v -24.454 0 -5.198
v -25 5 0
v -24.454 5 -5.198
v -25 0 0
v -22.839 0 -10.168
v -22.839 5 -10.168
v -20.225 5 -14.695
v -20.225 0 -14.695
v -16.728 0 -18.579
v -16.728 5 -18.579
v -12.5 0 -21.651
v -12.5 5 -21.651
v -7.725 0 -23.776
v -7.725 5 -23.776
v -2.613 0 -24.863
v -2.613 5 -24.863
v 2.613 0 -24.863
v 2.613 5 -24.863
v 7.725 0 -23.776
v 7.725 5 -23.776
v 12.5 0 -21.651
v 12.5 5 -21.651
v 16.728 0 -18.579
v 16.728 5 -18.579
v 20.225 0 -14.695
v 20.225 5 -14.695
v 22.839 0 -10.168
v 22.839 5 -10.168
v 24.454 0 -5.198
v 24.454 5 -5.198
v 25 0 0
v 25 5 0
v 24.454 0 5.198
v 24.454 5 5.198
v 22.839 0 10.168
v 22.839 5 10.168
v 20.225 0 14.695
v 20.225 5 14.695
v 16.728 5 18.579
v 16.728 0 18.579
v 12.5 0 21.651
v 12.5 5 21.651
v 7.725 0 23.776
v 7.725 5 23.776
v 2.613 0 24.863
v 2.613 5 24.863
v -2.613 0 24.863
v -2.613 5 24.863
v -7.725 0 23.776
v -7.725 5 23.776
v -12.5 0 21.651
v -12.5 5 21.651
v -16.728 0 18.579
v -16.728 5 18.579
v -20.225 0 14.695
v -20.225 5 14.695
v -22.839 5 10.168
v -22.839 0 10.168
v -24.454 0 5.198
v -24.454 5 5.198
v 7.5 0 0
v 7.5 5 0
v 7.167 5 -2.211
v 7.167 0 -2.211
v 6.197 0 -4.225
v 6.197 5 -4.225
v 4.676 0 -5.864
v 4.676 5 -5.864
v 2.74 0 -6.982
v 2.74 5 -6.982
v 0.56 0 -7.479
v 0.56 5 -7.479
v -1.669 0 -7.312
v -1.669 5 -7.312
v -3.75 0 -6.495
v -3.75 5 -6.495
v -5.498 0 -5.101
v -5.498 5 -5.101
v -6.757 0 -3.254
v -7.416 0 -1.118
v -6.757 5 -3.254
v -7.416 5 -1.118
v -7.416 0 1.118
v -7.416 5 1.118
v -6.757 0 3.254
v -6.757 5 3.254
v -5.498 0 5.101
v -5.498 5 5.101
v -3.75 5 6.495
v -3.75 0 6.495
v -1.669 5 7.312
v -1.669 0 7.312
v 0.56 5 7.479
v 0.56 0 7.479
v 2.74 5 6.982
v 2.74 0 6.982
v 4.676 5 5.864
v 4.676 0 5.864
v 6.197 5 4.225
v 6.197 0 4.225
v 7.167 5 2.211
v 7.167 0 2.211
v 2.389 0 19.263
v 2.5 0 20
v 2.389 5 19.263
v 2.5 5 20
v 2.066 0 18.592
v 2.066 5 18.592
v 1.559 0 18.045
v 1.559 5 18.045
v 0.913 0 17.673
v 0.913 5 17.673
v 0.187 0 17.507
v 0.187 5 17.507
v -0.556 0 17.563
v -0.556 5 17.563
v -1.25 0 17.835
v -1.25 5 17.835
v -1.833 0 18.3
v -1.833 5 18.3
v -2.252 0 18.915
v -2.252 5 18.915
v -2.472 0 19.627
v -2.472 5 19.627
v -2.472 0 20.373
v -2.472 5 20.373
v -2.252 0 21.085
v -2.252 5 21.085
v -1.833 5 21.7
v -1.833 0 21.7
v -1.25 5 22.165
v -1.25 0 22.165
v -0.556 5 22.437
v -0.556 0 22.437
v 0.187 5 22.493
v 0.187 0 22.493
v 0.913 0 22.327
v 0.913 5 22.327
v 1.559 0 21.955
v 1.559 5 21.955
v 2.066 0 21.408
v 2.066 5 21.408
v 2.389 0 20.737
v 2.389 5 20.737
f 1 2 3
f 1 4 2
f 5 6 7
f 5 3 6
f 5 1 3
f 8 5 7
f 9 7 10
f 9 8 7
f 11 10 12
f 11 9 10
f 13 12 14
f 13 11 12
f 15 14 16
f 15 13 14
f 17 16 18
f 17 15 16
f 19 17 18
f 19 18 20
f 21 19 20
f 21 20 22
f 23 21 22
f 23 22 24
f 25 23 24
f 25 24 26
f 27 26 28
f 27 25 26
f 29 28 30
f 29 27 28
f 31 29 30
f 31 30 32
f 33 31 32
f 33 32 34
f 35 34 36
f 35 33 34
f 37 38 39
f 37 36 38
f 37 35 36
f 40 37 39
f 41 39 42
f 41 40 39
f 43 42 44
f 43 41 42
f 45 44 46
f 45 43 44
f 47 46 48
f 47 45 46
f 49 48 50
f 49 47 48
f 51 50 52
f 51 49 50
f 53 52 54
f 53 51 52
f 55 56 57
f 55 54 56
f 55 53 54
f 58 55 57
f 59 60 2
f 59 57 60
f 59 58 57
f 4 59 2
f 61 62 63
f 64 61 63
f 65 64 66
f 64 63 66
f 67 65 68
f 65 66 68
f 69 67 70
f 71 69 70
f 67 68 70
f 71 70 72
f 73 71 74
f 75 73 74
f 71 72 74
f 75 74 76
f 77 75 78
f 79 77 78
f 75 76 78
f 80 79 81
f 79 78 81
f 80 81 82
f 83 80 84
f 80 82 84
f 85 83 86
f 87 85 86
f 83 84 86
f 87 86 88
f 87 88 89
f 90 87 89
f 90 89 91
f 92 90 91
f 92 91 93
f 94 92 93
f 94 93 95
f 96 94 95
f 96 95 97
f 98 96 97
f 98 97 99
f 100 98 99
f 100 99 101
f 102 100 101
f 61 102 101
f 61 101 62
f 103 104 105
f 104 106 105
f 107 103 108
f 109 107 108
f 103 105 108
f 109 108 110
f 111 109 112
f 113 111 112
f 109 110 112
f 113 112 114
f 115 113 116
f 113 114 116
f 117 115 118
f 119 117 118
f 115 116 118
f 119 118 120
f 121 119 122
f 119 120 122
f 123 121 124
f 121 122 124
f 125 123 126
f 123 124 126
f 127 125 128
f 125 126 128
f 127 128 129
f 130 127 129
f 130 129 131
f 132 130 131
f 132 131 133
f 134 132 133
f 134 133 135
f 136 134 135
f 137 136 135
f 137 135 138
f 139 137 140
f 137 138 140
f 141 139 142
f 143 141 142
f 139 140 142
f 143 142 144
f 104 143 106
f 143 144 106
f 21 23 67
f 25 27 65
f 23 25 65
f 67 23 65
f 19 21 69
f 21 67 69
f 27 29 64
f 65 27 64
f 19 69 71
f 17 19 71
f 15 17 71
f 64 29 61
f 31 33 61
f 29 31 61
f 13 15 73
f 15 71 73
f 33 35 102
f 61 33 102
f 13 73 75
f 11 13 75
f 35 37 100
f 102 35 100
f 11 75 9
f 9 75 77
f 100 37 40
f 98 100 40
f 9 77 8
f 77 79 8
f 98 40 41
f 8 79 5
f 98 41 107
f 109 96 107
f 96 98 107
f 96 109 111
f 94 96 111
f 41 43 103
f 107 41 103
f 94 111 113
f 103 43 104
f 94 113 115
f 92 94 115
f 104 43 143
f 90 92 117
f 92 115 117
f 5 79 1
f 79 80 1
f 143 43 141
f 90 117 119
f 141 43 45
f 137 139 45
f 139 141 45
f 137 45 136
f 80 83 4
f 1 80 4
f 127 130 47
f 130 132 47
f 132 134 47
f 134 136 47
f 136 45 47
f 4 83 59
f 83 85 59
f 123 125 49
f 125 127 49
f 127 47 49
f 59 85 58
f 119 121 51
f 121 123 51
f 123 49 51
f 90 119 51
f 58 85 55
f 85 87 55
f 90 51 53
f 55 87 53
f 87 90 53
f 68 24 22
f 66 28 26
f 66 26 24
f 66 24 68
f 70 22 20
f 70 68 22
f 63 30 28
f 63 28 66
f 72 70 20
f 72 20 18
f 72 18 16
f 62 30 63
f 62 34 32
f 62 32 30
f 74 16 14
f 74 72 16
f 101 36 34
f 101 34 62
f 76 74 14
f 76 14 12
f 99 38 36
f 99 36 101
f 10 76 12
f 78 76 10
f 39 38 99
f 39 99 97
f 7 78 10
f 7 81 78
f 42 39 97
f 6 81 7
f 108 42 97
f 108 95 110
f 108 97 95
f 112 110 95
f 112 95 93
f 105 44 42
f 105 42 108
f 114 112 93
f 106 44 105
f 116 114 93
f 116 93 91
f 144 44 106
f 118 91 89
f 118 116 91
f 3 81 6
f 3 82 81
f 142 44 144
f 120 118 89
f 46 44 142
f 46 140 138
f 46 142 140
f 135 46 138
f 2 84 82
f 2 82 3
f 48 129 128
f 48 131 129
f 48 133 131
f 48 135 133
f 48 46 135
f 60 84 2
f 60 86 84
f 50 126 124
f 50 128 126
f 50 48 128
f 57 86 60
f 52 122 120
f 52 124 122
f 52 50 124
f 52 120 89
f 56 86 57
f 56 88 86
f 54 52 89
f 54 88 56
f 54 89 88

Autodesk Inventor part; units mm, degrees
ref_plane "YZ Plane" through (0, 0, 0) normal (1, 0, 0) x (0, 1, 0)
ref_plane "XZ Plane" through (0, 0, 0) normal (0, 1, 0) x (-1, 0, 0)
ref_plane "XY Plane" through (0, 0, 0) normal (0, 0, 1) x (1, 0, 0)
sketch "Sketch1" plane through (0, 0, 0) normal (0, 1, 0) x (-1, 0, 0)
  circle A0 centre (0, 0) radius 25
  dimension "d0" = 50
extrude "Extrusion1" add sketch "Sketch1" along normal blind 5
sketch "Sketch2" plane through (0, 5, 0) normal (0, 1, 0) x (1, 0, 0)
  circle A0 centre (0, 0) radius 7.5
  dimension "d3" = 15
extrude "Extrusion2" cut sketch "Sketch2" against normal through all
sketch "Sketch3" plane through (0, 5, 0) normal (0, 1, 0) x (1, 0, 0)
  circle A0 centre (0, 0) radius 20 construction
sketch "Sketch4" plane through (0, 5, 0) normal (0, 1, 0) x (1, 0, 0)
  circle A0 centre (0, -20) radius 2.5
  point P0 (0, 0)
  dimension "d8" = 5
extrude "Extrusion3" cut sketch "Sketch4" against normal through all
sketch "Sketch5" plane through (0, 5, 0) normal (0, 1, 0) x (1, 0, 0)
  line L0 (0, 0) -> (-12.8558, 15.3209)
  line L1 (0, 0) -> (0, -27.4763)
  arc A0 (-10.0367, 16.3469) -> (-15.6748, 14.2948) centre (-12.8558, 15.3209) ccw
  arc A1 (-2.8191, -21.0261) -> (2.8191, -18.9739) centre (0, -20) ccw
  line L2 (-10.0367, 16.3469) -> (2.8191, -18.9739)
  line L3 (-2.8191, -21.0261) -> (-15.6748, 14.2948)
  circle A2 centre (0, 0) radius 3
  dimension "d11" = 140
  dimension "d14" = 20
  dimension "d15" = 3
  dimension "d17" = 3
  dimension "d18" = 6
properties part number "test wysiegu sprezyny"
